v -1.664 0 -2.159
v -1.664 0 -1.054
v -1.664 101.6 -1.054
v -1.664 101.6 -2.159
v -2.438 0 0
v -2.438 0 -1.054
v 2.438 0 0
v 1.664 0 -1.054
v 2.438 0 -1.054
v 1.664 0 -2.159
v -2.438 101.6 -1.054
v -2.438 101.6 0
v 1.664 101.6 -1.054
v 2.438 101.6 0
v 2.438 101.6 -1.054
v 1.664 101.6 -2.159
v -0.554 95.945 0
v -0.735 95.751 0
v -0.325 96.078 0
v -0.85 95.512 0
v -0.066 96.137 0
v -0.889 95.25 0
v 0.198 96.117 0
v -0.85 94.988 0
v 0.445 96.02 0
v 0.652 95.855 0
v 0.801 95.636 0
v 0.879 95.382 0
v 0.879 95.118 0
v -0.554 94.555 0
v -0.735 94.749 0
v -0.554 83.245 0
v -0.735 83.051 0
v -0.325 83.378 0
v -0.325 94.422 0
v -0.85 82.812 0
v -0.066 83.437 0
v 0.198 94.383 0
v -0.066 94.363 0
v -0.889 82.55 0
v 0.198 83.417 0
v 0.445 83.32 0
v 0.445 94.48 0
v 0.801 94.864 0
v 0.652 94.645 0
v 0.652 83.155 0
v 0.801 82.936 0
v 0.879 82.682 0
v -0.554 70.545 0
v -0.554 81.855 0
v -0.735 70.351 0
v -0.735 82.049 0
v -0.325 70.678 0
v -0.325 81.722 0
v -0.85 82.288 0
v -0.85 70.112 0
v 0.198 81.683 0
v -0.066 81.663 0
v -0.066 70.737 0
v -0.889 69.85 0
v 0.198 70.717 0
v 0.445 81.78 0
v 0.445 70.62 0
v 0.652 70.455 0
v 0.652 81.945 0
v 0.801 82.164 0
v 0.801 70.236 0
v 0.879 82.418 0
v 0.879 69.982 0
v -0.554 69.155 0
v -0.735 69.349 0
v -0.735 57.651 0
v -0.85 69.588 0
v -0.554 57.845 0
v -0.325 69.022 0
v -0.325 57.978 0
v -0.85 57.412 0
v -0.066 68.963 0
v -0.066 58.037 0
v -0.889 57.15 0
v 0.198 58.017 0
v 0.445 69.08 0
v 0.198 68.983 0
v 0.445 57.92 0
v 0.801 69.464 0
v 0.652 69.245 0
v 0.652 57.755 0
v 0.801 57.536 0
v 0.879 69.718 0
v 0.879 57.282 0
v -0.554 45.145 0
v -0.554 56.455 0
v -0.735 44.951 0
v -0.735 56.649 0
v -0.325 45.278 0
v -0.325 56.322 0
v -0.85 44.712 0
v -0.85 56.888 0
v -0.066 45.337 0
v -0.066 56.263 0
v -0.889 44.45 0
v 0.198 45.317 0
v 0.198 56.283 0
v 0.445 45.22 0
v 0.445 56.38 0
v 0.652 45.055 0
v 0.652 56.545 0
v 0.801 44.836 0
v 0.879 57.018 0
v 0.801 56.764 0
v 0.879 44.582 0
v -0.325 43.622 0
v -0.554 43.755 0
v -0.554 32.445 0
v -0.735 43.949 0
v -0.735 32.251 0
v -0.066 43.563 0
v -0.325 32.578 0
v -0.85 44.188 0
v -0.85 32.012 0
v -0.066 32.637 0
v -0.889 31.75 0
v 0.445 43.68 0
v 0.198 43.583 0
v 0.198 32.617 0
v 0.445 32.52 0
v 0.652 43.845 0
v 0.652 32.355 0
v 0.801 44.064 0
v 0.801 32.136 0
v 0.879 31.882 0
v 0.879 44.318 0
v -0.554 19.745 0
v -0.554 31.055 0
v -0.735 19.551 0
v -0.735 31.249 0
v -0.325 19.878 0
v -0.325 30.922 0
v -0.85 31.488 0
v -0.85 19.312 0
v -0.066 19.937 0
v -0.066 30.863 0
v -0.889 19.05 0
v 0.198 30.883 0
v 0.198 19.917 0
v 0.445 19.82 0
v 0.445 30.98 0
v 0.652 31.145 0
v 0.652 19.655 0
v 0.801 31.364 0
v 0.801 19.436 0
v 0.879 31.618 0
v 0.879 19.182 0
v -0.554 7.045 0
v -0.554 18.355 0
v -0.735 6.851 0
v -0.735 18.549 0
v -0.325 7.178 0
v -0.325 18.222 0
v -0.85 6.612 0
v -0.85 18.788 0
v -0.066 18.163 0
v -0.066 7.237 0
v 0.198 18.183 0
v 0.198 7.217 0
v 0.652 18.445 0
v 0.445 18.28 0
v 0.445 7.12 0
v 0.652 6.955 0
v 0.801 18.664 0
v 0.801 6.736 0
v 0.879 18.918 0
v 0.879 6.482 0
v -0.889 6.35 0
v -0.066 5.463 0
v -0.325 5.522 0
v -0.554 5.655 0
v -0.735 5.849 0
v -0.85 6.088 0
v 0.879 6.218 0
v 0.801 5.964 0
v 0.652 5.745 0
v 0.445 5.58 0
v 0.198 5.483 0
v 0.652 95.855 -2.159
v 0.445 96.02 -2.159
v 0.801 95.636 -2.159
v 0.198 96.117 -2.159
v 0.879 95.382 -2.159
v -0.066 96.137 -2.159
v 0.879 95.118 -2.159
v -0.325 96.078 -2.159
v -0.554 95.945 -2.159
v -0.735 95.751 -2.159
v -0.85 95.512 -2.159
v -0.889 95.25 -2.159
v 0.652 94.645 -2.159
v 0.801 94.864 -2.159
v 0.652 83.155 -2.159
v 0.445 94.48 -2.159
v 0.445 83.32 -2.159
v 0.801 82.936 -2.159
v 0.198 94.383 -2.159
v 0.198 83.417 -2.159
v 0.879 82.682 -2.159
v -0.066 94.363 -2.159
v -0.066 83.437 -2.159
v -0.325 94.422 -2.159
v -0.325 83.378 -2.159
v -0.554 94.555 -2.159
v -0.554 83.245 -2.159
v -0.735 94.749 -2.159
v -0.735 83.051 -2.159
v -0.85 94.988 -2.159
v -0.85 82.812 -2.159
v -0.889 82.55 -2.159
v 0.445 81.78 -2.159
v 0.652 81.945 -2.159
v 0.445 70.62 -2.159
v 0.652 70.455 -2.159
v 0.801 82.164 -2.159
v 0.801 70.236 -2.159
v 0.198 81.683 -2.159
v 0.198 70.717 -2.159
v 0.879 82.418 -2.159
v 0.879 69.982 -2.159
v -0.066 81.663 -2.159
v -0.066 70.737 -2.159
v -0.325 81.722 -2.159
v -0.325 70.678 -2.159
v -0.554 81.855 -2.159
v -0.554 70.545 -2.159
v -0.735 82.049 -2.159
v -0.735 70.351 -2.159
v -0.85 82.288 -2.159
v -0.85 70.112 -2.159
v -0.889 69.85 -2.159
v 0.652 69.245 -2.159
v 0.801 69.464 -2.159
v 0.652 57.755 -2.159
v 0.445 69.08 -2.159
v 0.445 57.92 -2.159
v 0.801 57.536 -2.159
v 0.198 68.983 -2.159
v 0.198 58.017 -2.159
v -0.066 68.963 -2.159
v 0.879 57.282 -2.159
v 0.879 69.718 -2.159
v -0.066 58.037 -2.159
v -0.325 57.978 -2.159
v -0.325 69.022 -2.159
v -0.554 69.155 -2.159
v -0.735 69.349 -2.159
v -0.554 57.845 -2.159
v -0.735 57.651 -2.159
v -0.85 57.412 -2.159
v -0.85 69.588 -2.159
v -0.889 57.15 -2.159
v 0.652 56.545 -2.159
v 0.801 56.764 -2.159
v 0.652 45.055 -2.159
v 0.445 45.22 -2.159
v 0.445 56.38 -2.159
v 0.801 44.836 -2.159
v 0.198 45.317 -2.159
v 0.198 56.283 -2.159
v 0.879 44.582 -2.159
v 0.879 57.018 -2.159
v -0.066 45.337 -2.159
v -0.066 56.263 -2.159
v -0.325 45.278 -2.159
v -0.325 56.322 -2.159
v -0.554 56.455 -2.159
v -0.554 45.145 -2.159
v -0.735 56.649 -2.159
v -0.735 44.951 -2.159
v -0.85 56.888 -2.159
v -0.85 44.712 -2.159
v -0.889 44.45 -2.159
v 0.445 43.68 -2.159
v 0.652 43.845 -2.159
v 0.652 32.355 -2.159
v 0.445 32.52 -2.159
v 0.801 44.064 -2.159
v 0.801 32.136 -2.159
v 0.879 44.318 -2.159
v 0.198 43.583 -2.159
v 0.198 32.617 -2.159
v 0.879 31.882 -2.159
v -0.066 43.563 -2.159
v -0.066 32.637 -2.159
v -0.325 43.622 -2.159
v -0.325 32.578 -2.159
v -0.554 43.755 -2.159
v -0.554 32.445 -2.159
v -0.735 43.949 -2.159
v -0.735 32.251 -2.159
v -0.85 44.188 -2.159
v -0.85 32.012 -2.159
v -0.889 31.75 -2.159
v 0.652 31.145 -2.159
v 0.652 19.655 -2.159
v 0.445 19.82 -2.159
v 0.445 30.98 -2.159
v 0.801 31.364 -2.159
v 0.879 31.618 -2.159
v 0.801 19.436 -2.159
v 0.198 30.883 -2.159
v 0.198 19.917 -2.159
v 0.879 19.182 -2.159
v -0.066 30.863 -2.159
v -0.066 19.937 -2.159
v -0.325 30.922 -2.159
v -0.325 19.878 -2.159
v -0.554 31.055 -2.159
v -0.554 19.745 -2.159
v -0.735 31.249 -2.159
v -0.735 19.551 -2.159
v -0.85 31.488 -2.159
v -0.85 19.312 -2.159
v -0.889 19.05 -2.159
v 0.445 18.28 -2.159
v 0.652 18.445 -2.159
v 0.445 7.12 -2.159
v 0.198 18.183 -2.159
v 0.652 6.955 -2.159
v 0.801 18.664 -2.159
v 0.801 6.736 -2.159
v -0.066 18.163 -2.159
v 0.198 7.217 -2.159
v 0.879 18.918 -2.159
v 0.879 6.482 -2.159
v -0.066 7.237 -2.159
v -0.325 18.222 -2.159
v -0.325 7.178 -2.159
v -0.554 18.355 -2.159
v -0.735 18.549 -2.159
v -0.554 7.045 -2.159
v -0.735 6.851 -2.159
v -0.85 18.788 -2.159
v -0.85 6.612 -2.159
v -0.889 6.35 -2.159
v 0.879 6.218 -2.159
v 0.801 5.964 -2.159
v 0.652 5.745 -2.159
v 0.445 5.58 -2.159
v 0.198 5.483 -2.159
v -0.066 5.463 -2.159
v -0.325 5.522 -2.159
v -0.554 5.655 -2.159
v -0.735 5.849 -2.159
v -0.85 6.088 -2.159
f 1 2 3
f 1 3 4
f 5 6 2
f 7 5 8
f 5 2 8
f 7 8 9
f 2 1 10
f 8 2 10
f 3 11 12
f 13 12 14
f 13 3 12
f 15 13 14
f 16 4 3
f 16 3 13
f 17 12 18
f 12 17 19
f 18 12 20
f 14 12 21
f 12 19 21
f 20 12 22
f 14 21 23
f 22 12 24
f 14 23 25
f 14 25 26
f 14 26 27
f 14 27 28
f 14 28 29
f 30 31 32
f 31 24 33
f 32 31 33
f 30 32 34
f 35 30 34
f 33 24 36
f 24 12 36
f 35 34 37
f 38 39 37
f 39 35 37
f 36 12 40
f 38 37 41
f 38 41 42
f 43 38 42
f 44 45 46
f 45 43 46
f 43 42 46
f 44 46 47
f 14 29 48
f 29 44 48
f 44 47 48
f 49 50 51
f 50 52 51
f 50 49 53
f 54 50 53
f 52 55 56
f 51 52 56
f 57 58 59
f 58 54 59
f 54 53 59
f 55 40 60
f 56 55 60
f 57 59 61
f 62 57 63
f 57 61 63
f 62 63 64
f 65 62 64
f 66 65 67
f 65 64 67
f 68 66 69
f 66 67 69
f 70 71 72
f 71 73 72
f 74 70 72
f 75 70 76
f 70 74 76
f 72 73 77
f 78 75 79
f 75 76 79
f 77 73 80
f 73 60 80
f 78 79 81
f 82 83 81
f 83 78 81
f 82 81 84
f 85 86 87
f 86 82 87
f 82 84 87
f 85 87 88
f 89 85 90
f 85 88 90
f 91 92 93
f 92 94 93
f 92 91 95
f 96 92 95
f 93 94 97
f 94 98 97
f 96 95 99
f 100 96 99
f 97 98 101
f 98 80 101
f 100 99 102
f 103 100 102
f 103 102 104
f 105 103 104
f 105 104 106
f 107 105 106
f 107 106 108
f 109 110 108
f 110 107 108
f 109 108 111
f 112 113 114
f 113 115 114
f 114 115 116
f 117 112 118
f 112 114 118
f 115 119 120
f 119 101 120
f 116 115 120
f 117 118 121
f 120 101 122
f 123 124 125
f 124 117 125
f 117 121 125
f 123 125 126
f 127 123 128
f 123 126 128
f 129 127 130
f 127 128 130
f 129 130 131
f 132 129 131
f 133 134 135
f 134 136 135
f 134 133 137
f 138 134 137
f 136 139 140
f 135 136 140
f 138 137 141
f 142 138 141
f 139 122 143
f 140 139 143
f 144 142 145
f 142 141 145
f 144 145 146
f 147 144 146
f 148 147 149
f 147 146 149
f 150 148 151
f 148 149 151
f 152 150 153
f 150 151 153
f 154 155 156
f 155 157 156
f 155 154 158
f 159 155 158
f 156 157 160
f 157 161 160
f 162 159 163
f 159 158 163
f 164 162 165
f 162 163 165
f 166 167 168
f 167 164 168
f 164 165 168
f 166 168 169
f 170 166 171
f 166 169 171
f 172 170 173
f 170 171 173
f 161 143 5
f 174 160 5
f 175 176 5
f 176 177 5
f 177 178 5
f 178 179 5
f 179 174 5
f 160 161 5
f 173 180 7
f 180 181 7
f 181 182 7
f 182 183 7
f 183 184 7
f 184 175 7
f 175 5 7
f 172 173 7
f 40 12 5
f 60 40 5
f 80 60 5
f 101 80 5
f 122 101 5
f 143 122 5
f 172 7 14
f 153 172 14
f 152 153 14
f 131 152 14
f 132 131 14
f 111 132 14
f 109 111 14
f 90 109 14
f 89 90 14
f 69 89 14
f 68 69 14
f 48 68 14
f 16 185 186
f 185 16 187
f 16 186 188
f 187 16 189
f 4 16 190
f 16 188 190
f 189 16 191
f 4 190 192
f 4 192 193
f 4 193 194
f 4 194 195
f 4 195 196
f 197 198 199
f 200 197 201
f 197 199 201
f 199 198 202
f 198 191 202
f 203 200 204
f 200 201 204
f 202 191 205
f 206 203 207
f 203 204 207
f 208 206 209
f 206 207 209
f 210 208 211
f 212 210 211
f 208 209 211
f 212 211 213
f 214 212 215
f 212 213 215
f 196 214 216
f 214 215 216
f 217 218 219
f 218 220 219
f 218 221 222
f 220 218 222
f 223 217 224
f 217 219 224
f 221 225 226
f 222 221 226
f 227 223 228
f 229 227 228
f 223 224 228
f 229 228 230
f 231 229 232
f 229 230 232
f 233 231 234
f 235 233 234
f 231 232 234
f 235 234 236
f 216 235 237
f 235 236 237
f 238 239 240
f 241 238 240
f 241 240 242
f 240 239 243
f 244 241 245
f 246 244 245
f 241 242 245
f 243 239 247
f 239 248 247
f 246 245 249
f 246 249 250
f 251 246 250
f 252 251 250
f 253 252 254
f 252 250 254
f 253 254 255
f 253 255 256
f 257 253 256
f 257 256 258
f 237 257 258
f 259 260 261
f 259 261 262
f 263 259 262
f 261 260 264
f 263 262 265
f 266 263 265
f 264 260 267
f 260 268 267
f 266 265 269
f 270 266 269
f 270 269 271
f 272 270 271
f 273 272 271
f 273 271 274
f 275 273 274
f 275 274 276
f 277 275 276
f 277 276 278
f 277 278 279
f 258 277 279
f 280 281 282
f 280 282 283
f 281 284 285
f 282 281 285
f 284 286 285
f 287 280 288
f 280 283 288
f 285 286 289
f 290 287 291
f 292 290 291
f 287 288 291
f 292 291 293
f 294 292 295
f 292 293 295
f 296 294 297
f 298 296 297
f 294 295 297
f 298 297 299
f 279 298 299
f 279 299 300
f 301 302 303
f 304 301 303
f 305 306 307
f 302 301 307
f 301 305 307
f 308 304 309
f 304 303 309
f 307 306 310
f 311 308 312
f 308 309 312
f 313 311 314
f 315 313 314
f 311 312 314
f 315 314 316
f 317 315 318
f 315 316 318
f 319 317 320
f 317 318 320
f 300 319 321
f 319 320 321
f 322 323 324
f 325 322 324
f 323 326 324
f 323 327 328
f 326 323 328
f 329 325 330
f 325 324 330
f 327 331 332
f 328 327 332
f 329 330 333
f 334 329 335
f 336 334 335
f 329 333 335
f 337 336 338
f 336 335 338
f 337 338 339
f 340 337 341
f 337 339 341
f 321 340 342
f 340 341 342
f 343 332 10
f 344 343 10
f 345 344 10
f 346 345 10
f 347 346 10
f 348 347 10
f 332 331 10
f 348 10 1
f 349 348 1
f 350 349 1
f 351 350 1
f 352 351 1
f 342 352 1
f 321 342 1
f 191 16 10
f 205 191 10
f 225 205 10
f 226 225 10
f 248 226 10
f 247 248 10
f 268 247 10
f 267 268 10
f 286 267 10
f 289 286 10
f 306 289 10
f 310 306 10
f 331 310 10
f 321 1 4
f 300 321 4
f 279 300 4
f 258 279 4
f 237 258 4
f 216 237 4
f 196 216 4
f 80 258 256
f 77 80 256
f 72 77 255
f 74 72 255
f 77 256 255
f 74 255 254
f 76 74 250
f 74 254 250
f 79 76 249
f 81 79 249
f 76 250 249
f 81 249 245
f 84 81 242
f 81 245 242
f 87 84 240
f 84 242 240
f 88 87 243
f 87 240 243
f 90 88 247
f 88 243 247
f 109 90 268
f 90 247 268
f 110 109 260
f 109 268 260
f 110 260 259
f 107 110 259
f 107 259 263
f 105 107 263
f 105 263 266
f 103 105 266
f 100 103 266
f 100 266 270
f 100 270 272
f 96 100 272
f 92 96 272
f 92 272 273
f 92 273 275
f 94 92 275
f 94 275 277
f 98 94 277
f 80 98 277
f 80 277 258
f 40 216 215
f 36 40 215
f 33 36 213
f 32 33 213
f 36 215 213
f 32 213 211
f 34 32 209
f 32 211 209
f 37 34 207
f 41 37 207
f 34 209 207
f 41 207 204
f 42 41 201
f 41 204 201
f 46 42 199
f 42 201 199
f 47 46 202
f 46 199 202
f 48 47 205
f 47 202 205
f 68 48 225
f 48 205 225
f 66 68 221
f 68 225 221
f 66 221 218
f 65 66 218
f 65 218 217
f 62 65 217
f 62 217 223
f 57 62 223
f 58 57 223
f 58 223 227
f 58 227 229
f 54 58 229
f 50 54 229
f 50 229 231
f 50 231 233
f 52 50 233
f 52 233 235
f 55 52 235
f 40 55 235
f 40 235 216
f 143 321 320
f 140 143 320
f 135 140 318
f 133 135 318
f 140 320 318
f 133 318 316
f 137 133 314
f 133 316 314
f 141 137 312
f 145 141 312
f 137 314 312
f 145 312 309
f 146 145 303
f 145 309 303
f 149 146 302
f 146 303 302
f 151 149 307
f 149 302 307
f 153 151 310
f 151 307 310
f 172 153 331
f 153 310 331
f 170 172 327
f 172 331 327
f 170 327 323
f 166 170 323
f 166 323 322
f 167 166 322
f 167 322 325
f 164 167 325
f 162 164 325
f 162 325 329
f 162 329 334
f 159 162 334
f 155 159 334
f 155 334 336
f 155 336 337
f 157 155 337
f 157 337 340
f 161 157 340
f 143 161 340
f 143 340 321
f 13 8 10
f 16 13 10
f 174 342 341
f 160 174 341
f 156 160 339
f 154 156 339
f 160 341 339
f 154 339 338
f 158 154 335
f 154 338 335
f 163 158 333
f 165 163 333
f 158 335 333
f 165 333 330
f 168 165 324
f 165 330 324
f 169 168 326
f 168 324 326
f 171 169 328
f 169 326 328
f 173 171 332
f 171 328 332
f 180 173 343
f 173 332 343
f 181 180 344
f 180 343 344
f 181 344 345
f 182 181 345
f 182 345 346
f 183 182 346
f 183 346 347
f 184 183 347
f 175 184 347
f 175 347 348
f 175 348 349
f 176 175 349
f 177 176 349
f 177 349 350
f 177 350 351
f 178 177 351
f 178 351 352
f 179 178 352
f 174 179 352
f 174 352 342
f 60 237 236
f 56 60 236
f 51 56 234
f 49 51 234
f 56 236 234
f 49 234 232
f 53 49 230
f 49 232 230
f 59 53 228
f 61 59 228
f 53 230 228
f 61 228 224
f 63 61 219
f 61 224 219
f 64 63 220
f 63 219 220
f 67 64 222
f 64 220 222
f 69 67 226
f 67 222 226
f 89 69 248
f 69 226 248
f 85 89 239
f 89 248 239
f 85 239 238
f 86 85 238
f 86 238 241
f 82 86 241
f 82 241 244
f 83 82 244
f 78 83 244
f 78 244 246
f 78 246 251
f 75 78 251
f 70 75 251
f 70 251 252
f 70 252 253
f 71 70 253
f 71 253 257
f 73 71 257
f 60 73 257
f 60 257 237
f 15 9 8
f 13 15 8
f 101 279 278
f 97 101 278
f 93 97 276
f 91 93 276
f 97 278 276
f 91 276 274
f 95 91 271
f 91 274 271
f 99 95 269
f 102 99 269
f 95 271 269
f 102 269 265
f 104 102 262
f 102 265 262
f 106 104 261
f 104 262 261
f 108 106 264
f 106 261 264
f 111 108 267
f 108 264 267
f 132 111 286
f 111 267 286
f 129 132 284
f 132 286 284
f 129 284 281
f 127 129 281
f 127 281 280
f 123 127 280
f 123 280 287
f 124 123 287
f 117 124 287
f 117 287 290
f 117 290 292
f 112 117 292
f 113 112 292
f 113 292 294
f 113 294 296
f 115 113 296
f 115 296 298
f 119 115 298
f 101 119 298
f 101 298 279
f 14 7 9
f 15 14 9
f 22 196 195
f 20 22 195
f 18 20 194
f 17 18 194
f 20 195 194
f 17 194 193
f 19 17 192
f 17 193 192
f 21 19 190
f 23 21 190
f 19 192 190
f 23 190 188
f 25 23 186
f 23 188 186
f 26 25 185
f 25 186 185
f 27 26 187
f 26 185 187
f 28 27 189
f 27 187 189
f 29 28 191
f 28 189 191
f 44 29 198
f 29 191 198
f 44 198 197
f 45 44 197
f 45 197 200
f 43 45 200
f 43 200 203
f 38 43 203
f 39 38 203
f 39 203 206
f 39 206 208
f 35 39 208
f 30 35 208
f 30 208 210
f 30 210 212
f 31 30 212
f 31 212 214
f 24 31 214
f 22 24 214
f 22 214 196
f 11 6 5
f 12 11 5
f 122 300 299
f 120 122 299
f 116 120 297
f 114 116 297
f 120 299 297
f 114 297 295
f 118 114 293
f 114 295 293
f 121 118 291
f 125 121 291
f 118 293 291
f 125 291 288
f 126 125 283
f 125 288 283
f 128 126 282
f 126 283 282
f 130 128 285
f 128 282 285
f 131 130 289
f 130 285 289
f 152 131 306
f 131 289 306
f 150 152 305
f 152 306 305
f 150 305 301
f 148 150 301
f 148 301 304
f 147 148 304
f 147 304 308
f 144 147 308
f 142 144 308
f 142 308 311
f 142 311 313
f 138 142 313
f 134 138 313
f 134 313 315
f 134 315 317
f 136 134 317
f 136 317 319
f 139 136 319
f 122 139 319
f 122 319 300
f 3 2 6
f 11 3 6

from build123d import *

# Parameters (mm, degrees)
SKETCH1_W           = 1.6637
SKETCH1_H           = 1.1049
BOSS_EXTRUDE1_DEPTH = 101.6
CUT_EXTRUDE1_REACH  = 103.652
SKETCH2_R           = 0.889


with BuildPart() as part:
    # Sketch1 → Boss-Extrude1 (new body)
    with BuildSketch(Plane(origin=(0, 0, 0), x_dir=(1, 0, 0), z_dir=(0, 1, 0))):
        with Locations((-0.83185, 1.60655)):
            Rectangle(SKETCH1_W, SKETCH1_H)
        with Locations((0.83185, 1.60655)):
            Rectangle(SKETCH1_W, SKETCH1_H)
        Polygon((0, 1.0541), (0, 0), (2.4384, 0), (2.4384, 1.0541), (1.6637, 1.0541), align=None)
        Polygon((-2.4384, 0), (0, 0), (0, 1.0541), (-1.6637, 1.0541), (-2.4384, 1.0541), align=None)
    extrude(amount=BOSS_EXTRUDE1_DEPTH)

    # Sketch2 → Cut-Extrude1 (cut, up to next)
    with BuildSketch(Plane(origin=(0, 0, -2.159), x_dir=(-1, 0, 0), z_dir=(0, 0, -1)), mode=Mode.PRIVATE) as cut_extrude1_sk1:
        with Locations((0, 6.35)):
            Circle(SKETCH2_R)
    cut_extrude1_tool1 = extrude(cut_extrude1_sk1.sketch, amount=-CUT_EXTRUDE1_REACH, mode=Mode.PRIVATE) & part.part
    # Sketch2 → Cut-Extrude1 (cut, up to next)
    with BuildSketch(Plane(origin=(0, 0, -2.159), x_dir=(-1, 0, 0), z_dir=(0, 0, -1)), mode=Mode.PRIVATE) as cut_extrude1_sk2:
        with Locations((0, 19.05)):
            Circle(SKETCH2_R)
    cut_extrude1_tool2 = extrude(cut_extrude1_sk2.sketch, amount=-CUT_EXTRUDE1_REACH, mode=Mode.PRIVATE) & part.part
    # Sketch2 → Cut-Extrude1 (cut, up to next)
    with BuildSketch(Plane(origin=(0, 0, -2.159), x_dir=(-1, 0, 0), z_dir=(0, 0, -1)), mode=Mode.PRIVATE) as cut_extrude1_sk3:
        with Locations((0, 31.75)):
            Circle(SKETCH2_R)
    cut_extrude1_tool3 = extrude(cut_extrude1_sk3.sketch, amount=-CUT_EXTRUDE1_REACH, mode=Mode.PRIVATE) & part.part
    # Sketch2 → Cut-Extrude1 (cut, up to next)
    with BuildSketch(Plane(origin=(0, 0, -2.159), x_dir=(-1, 0, 0), z_dir=(0, 0, -1)), mode=Mode.PRIVATE) as cut_extrude1_sk4:
        with Locations((0, 44.45)):
            Circle(SKETCH2_R)
    cut_extrude1_tool4 = extrude(cut_extrude1_sk4.sketch, amount=-CUT_EXTRUDE1_REACH, mode=Mode.PRIVATE) & part.part
    # Sketch2 → Cut-Extrude1 (cut, up to next)
    with BuildSketch(Plane(origin=(0, 0, -2.159), x_dir=(-1, 0, 0), z_dir=(0, 0, -1)), mode=Mode.PRIVATE) as cut_extrude1_sk5:
        with Locations((0, 57.15)):
            Circle(SKETCH2_R)
    cut_extrude1_tool5 = extrude(cut_extrude1_sk5.sketch, amount=-CUT_EXTRUDE1_REACH, mode=Mode.PRIVATE) & part.part
    # Sketch2 → Cut-Extrude1 (cut, up to next)
    with BuildSketch(Plane(origin=(0, 0, -2.159), x_dir=(-1, 0, 0), z_dir=(0, 0, -1)), mode=Mode.PRIVATE) as cut_extrude1_sk6:
        with Locations((0, 69.85)):
            Circle(SKETCH2_R)
    cut_extrude1_tool6 = extrude(cut_extrude1_sk6.sketch, amount=-CUT_EXTRUDE1_REACH, mode=Mode.PRIVATE) & part.part
    # Sketch2 → Cut-Extrude1 (cut, up to next)
    with BuildSketch(Plane(origin=(0, 0, -2.159), x_dir=(-1, 0, 0), z_dir=(0, 0, -1)), mode=Mode.PRIVATE) as cut_extrude1_sk7:
        with Locations((0, 82.55)):
            Circle(SKETCH2_R)
    cut_extrude1_tool7 = extrude(cut_extrude1_sk7.sketch, amount=-CUT_EXTRUDE1_REACH, mode=Mode.PRIVATE) & part.part
    # Sketch2 → Cut-Extrude1 (cut, up to next)
    with BuildSketch(Plane(origin=(0, 0, -2.159), x_dir=(-1, 0, 0), z_dir=(0, 0, -1)), mode=Mode.PRIVATE) as cut_extrude1_sk8:
        with Locations((0, 95.25)):
            Circle(SKETCH2_R)
    cut_extrude1_tool8 = extrude(cut_extrude1_sk8.sketch, amount=-CUT_EXTRUDE1_REACH, mode=Mode.PRIVATE) & part.part
    add(cut_extrude1_tool1.solids().sort_by_distance((0, 6.35, -2.159))[0], mode=Mode.SUBTRACT)
    add(cut_extrude1_tool2.solids().sort_by_distance((0, 19.05, -2.159))[0], mode=Mode.SUBTRACT)
    add(cut_extrude1_tool3.solids().sort_by_distance((0, 31.75, -2.159))[0], mode=Mode.SUBTRACT)
    add(cut_extrude1_tool4.solids().sort_by_distance((0, 44.45, -2.159))[0], mode=Mode.SUBTRACT)
    add(cut_extrude1_tool5.solids().sort_by_distance((0, 57.15, -2.159))[0], mode=Mode.SUBTRACT)
    add(cut_extrude1_tool6.solids().sort_by_distance((0, 69.85, -2.159))[0], mode=Mode.SUBTRACT)
    add(cut_extrude1_tool7.solids().sort_by_distance((0, 82.55, -2.159))[0], mode=Mode.SUBTRACT)
    add(cut_extrude1_tool8.solids().sort_by_distance((0, 95.25, -2.159))[0], mode=Mode.SUBTRACT)


solid = part.part
